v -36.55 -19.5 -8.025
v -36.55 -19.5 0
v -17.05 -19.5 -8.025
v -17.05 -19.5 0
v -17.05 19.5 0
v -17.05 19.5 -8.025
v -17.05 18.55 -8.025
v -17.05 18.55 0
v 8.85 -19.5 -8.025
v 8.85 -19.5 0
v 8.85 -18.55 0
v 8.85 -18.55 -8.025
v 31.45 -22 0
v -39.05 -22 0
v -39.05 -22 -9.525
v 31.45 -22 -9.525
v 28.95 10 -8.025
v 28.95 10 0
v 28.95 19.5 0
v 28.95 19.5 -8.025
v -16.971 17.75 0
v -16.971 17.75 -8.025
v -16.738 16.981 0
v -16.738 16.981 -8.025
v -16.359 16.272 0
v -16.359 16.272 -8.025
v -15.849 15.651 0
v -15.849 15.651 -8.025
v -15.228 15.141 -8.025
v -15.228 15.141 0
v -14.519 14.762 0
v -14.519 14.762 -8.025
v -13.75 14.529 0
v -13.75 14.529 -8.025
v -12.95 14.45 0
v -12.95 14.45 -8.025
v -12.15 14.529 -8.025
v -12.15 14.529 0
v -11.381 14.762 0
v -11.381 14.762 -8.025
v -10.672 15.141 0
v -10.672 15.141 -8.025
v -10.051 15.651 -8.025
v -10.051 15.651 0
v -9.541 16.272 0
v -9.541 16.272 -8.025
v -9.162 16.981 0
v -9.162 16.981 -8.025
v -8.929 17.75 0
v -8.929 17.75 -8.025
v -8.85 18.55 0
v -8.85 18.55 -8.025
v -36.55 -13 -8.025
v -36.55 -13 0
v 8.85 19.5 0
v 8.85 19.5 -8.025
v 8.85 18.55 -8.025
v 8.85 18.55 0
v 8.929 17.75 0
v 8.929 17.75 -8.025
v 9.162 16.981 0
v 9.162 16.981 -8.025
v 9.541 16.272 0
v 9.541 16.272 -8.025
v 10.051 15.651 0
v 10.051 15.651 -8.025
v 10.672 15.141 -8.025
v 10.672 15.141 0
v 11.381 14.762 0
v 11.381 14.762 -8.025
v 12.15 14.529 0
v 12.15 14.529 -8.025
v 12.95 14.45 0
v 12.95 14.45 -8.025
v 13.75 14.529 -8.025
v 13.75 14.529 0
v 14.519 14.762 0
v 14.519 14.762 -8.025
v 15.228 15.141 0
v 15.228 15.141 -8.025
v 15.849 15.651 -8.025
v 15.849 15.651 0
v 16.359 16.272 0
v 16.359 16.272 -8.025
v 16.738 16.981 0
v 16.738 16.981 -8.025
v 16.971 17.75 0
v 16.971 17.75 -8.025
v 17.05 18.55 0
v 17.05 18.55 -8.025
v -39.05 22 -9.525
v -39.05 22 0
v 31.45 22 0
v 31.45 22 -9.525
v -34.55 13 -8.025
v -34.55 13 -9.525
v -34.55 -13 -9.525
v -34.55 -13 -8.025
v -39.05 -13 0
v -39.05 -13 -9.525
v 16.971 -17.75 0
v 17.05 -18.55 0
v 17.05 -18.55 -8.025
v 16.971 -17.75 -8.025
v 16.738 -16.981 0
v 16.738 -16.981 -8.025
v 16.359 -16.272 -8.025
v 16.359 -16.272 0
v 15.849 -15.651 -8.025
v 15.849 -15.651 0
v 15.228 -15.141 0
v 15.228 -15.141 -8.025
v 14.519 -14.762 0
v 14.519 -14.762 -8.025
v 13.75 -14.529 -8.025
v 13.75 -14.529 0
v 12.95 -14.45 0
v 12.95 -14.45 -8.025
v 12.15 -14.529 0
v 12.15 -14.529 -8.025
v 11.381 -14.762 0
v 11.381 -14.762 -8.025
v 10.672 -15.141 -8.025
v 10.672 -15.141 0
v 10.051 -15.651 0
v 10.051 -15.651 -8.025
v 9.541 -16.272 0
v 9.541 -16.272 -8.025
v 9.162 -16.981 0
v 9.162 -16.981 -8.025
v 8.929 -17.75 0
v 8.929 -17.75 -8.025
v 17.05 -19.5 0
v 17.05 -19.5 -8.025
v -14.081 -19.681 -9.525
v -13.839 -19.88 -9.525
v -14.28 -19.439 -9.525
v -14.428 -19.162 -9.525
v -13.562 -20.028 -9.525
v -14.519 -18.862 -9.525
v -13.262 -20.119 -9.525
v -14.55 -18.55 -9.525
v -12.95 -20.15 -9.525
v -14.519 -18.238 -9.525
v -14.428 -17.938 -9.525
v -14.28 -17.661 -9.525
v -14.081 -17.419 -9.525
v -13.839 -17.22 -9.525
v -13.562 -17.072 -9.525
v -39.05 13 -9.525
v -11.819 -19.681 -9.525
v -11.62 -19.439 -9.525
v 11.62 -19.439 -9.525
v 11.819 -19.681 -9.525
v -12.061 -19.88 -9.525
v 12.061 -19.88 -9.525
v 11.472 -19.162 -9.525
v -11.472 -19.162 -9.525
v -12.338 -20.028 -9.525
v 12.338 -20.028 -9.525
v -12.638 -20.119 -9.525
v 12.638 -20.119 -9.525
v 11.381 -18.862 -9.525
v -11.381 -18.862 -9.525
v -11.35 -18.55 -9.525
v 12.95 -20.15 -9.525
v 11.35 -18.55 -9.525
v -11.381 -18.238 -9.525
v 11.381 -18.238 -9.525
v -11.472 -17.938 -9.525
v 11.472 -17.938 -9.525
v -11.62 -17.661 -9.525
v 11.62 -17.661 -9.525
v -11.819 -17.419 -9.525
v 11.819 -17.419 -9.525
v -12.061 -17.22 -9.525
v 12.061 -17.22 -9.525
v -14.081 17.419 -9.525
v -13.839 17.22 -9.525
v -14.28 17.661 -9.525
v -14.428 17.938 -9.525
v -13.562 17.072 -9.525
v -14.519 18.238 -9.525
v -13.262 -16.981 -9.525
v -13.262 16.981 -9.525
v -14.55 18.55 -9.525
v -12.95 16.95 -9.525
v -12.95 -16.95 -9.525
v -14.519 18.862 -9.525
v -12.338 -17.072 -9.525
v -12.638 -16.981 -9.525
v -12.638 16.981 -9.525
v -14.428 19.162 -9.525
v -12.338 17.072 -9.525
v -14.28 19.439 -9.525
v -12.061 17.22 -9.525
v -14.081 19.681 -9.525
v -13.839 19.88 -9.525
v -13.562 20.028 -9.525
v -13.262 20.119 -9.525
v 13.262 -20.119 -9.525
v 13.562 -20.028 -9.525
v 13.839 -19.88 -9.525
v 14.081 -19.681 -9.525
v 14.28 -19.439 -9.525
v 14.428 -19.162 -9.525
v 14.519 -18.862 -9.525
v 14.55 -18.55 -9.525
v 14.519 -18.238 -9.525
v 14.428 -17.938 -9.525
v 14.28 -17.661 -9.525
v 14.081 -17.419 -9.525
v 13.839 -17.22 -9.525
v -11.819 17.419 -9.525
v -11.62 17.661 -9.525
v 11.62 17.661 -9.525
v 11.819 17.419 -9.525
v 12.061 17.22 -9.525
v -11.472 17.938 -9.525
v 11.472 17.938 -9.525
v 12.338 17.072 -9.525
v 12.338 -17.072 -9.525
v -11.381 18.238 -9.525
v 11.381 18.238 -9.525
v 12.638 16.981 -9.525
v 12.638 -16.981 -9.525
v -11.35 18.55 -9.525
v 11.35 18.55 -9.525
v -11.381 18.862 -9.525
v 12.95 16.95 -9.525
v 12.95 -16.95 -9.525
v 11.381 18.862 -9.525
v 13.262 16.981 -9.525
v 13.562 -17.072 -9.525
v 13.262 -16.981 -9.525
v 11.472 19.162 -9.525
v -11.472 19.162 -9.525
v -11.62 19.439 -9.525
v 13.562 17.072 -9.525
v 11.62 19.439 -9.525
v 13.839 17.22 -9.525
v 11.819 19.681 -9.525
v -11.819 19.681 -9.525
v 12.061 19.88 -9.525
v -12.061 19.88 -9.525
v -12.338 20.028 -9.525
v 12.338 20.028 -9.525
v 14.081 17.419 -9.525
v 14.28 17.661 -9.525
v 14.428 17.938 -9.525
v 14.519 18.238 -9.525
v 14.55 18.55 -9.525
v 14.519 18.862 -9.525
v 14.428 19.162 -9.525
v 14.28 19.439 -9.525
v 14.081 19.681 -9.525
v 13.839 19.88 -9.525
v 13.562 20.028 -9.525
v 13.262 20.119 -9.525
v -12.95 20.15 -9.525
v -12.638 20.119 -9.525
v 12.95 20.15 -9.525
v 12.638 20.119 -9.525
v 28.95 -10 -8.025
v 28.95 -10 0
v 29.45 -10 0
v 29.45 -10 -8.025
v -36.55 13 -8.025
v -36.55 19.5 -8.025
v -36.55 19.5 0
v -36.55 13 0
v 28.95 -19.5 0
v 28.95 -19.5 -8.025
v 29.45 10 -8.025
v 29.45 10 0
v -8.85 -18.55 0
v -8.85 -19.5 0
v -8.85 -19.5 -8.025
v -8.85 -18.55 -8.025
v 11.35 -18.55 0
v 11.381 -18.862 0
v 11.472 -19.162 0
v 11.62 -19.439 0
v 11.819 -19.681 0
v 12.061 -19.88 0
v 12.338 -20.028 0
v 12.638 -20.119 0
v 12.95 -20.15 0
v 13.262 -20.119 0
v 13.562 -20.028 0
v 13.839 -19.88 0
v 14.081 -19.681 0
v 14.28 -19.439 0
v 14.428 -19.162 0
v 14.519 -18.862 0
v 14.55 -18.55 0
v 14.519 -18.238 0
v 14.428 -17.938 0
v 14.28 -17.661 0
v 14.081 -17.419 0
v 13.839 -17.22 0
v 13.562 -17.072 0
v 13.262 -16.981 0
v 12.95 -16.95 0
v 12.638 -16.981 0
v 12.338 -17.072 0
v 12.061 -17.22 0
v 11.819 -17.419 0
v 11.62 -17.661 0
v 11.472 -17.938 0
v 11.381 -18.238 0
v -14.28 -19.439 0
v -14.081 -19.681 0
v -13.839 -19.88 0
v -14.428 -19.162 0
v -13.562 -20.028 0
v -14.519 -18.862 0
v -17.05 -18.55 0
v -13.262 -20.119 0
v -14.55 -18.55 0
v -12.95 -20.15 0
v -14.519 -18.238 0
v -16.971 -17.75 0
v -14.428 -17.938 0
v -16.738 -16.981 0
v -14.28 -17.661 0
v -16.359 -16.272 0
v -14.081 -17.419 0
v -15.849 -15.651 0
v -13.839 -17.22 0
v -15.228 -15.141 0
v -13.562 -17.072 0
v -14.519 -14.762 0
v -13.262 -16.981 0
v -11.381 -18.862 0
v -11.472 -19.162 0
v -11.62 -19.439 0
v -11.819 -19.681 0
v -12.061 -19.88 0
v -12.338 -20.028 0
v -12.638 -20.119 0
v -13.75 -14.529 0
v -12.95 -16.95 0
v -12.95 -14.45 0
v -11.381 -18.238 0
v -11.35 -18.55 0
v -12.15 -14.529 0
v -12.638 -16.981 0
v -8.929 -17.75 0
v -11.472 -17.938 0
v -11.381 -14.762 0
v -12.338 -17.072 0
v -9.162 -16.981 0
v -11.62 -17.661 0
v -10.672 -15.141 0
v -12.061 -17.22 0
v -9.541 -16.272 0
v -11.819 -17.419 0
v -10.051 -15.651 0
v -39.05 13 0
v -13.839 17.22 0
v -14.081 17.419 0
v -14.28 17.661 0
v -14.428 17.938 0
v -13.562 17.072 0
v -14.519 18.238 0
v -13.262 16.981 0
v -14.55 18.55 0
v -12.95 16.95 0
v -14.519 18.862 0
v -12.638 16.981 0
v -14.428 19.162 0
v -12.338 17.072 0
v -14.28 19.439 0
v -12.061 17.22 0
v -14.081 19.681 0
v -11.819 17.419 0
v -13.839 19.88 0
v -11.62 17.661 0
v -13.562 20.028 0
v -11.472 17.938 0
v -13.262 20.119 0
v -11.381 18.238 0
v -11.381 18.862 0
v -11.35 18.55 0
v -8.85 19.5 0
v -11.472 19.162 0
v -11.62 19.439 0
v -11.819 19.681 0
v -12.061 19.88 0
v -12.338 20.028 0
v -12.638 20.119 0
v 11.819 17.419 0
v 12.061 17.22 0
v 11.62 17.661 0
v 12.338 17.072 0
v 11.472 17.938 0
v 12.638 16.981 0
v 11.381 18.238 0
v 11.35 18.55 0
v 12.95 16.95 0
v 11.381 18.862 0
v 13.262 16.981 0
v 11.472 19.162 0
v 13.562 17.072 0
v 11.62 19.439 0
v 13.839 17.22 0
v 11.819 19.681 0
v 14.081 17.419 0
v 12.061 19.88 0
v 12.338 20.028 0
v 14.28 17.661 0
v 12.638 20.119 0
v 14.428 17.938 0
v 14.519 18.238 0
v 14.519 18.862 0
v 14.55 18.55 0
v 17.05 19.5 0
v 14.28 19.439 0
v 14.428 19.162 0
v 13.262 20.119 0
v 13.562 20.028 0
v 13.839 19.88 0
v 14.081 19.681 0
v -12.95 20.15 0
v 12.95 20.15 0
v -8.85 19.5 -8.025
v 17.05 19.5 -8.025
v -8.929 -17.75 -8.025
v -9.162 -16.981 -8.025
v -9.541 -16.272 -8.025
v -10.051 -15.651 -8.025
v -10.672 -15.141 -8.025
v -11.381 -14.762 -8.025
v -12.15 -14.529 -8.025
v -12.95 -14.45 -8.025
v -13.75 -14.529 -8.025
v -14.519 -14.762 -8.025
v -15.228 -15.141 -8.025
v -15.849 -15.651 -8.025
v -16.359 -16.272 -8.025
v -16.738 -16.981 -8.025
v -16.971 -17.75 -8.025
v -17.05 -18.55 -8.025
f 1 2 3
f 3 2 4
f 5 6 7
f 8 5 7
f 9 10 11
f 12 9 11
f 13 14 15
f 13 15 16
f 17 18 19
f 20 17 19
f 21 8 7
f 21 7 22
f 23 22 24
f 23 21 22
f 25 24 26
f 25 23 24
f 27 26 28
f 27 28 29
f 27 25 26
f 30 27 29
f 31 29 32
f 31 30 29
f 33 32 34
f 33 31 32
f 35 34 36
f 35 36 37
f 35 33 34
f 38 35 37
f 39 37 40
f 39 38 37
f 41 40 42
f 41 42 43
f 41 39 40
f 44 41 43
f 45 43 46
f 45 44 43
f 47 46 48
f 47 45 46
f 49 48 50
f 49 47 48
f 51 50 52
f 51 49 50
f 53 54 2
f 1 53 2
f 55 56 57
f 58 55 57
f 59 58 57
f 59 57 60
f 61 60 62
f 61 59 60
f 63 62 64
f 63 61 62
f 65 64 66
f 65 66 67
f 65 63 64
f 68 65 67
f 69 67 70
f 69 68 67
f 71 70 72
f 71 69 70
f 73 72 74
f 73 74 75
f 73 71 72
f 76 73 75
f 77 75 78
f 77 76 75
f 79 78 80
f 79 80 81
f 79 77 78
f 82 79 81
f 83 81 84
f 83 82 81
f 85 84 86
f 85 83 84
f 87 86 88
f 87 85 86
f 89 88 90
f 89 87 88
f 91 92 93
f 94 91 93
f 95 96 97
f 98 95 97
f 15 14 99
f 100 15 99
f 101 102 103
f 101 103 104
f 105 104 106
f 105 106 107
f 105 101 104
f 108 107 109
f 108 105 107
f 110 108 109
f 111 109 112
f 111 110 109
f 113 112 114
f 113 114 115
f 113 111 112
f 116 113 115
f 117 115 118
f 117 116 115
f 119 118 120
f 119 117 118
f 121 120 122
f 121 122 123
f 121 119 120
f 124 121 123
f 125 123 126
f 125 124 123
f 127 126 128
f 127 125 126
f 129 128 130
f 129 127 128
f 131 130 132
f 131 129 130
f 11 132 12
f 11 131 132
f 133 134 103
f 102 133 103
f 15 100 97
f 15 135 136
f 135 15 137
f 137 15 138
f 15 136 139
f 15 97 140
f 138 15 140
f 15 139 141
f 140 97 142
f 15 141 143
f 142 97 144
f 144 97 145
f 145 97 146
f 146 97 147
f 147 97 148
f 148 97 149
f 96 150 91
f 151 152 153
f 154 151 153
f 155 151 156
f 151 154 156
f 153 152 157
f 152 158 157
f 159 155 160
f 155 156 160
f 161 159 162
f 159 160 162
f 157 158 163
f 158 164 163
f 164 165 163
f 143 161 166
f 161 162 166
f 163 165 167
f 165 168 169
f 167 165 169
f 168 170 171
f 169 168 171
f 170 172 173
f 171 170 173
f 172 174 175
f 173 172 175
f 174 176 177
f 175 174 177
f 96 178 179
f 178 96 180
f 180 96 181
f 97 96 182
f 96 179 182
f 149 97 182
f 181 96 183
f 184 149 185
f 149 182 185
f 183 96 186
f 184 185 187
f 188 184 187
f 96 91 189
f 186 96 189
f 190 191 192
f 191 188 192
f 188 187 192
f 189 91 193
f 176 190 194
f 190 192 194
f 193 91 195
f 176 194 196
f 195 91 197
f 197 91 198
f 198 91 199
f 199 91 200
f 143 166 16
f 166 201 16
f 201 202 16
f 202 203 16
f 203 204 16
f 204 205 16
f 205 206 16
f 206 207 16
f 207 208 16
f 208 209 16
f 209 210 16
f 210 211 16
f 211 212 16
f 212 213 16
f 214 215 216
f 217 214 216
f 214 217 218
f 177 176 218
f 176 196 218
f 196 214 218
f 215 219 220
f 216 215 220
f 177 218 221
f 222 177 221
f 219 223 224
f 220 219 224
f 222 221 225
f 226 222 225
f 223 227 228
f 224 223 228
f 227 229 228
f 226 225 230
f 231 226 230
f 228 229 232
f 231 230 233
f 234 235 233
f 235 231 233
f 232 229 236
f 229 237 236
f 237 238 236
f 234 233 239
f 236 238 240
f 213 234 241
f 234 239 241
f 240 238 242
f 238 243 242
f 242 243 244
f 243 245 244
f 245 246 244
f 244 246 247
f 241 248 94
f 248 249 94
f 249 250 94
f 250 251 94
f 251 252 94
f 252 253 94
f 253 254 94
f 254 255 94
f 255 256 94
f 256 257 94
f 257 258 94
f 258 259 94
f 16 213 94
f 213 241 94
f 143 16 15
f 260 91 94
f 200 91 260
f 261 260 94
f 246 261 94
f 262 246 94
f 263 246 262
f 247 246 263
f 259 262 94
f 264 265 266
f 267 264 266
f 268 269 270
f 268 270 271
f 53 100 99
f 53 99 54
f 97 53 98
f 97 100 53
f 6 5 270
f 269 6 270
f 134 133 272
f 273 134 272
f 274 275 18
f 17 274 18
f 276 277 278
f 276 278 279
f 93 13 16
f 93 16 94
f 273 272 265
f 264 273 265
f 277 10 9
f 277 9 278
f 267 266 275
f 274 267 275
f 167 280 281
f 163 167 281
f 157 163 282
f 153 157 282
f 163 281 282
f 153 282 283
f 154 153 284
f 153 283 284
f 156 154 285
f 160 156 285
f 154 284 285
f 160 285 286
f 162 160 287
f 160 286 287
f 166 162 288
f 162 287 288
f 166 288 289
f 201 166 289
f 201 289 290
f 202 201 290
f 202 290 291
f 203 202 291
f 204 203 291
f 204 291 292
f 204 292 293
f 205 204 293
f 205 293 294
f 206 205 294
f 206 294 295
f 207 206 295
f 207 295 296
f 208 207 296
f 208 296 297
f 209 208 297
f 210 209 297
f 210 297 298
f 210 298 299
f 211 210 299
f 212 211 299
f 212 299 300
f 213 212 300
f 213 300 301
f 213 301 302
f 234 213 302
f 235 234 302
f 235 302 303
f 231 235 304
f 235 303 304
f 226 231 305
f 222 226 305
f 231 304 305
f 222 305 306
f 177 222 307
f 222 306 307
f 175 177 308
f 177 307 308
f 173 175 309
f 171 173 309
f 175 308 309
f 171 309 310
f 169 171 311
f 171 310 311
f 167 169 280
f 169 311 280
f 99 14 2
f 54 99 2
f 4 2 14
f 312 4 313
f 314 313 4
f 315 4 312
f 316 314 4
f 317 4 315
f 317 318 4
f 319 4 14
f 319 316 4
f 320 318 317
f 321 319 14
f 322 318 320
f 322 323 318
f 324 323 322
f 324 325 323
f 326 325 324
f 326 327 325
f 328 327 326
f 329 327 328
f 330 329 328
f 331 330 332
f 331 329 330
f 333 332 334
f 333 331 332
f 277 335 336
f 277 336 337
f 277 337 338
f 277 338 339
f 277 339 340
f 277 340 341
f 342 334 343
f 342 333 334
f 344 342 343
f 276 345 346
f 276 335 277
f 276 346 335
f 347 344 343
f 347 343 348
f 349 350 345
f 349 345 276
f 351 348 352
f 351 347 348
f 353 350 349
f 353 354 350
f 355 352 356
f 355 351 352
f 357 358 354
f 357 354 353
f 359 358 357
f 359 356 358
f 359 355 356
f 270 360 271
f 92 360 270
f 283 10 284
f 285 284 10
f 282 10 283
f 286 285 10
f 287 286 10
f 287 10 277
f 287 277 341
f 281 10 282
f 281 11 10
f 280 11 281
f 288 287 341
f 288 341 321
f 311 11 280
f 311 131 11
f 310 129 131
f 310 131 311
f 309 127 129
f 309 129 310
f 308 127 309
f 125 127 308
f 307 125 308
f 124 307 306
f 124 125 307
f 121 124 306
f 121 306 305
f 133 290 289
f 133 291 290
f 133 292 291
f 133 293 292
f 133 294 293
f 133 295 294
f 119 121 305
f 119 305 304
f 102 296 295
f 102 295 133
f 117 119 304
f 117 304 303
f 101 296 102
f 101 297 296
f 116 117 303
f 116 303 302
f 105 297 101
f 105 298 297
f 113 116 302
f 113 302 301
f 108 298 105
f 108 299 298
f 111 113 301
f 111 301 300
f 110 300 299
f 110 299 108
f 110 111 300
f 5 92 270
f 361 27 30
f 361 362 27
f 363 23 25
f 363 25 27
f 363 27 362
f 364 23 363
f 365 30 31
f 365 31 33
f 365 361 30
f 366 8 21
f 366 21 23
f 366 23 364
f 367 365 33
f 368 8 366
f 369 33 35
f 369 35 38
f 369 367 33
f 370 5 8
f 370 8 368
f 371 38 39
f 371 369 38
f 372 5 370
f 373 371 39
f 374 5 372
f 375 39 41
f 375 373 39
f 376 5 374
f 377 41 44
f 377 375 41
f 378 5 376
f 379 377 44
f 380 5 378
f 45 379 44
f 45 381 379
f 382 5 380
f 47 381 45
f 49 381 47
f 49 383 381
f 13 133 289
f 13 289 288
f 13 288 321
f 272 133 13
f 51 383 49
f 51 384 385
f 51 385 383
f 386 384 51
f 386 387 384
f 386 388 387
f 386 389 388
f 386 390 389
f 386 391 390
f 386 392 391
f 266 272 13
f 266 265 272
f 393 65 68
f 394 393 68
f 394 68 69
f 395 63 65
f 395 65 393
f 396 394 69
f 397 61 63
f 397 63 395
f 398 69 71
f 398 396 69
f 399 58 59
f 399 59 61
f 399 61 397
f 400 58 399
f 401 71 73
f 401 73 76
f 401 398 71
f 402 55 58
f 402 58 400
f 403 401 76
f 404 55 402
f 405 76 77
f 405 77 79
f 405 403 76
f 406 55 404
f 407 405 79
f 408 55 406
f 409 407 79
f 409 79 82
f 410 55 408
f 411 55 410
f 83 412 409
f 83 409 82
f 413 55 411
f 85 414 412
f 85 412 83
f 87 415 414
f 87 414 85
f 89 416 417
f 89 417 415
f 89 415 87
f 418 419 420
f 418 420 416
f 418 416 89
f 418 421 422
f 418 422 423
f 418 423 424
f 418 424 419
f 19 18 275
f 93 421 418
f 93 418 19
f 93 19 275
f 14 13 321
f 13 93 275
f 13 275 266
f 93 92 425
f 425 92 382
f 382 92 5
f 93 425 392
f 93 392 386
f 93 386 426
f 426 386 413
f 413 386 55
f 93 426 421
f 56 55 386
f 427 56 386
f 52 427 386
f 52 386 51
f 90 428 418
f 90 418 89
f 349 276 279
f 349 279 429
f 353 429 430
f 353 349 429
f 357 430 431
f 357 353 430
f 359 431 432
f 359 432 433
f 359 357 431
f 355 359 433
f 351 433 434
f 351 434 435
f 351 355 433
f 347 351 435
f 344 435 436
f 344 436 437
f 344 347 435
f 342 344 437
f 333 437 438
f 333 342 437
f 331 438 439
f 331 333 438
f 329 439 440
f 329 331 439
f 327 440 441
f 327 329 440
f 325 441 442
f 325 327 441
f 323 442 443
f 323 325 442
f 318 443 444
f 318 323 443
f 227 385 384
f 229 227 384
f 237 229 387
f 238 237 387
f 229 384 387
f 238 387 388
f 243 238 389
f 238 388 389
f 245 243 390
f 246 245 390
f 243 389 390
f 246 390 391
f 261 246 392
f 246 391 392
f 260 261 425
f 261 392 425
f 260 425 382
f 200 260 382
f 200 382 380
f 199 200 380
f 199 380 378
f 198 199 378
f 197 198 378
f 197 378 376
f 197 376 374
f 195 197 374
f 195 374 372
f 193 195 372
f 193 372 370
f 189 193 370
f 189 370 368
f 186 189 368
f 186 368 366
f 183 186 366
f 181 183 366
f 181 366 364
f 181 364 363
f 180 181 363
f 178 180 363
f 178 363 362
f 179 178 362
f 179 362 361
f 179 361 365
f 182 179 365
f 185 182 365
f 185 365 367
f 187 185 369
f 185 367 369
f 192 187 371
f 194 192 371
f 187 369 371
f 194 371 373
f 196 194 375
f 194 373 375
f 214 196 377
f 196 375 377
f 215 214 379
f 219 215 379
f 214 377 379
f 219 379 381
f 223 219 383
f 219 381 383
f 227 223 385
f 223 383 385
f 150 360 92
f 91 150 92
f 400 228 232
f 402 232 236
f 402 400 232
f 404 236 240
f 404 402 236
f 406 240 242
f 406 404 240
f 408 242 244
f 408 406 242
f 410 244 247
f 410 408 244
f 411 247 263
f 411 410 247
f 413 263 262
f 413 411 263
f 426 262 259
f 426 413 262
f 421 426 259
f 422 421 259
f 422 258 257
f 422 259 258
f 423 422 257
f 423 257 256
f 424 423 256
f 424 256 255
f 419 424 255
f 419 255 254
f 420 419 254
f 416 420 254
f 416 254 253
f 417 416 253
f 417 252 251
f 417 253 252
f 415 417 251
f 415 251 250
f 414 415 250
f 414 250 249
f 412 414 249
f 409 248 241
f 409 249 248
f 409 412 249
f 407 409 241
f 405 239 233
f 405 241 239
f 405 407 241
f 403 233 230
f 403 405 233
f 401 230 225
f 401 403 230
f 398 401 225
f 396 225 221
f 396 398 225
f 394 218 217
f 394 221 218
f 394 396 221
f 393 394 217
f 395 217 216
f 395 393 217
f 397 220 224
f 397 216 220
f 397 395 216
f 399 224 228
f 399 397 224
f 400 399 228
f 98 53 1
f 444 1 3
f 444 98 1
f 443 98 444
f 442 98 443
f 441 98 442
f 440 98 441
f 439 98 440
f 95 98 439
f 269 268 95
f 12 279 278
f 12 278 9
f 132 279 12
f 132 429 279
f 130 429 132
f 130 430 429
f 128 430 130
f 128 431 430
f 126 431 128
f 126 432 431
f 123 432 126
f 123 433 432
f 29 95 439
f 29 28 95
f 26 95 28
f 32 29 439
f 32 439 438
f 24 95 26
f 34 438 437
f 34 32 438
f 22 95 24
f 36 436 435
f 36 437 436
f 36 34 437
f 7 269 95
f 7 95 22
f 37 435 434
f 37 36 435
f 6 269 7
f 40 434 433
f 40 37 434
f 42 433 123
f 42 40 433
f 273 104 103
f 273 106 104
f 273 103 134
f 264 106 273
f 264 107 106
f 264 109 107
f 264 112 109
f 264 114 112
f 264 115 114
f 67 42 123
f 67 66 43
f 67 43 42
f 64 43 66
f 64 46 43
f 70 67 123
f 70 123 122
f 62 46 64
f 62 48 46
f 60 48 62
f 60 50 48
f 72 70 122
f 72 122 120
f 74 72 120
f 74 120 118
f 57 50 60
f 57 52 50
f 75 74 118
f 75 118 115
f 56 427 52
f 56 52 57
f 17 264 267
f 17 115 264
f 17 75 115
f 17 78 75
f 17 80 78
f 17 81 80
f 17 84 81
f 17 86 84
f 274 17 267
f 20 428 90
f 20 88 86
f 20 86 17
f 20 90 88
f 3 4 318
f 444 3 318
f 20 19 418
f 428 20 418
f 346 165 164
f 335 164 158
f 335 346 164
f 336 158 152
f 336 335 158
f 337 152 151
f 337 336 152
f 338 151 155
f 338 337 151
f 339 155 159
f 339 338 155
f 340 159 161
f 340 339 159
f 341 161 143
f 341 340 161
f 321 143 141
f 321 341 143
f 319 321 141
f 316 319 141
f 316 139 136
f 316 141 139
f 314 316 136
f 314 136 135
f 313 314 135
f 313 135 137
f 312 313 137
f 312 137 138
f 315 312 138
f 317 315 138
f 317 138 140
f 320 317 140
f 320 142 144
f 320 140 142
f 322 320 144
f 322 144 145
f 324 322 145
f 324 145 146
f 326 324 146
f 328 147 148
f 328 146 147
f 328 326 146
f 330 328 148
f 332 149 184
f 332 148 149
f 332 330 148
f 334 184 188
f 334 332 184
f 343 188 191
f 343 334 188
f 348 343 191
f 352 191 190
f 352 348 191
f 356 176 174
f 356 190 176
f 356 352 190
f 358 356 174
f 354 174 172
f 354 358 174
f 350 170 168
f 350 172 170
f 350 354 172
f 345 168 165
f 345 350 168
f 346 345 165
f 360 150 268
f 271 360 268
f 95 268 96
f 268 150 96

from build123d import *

# Parameters (mm, degrees)
SKETCH_W                = 70.5
SKETCH_H                = 44
PAD_DEPTH               = 9.525
SKETCH001_R             = 1.6
POCKET_DEPTH            = 176.821853
SKETCH001_MIRRORED_2_R  = 1.6
POCKET_MIRRORED_2_DEPTH = 176.821853
POCKET001_DEPTH         = 8.025
SKETCH003_W             = 4.5
SKETCH003_H             = 26
POCKET002_DEPTH         = 9.526


with BuildPart() as part:
    # Sketch → Pad (new body)
    with BuildSketch(Plane.XY):
        with Locations((-3.8, 0)):
            Rectangle(SKETCH_W, SKETCH_H)
    extrude(amount=-PAD_DEPTH)

    # Sketch001 (on Face5 of Pad) → Pocket (cut, through all)
    with BuildSketch(Plane.XY):
        with Locations((-12.95, 18.55)):
            Circle(SKETCH001_R)
    pocket = extrude(amount=-POCKET_DEPTH, mode=Mode.SUBTRACT)

    # Sketch001 Mirrored 2 → Pocket Mirrored 2 (cut, through all)
    with BuildSketch(Plane(origin=(0, 0, 0), x_dir=(-1, 0, 0), z_dir=(0, 0, -1))):
        with Locations((-12.95, 18.55)):
            Circle(SKETCH001_MIRRORED_2_R)
    pocket_mirrored_2 = extrude(amount=POCKET_MIRRORED_2_DEPTH, mode=Mode.SUBTRACT)

    # Mirrored001: Pocket, Pocket Mirrored 2 across XZ
    add(pocket.mirror(Plane.XZ), mode=Mode.SUBTRACT)
    add(pocket_mirrored_2.mirror(Plane.XZ), mode=Mode.SUBTRACT)

    # Sketch002 (on Face4 of MultiTransform) → Pocket001 (cut)
    with BuildSketch(Plane.XY):
        with BuildLine():
            Line((29.45, -10), (29.45, 10))
            Line((29.45, 10), (28.95, 10))
            Line((28.95, 10), (28.95, 19.5))
            Line((28.95, 19.5), (17.05, 19.5))
            Line((17.05, 19.5), (17.05, 18.55))
            ThreePointArc((8.85, 18.55), (12.95, 14.45), (17.05, 18.55))
            Line((8.85, 19.5), (8.85, 18.55))
            Line((8.85, 19.5), (-8.85, 19.5))
            Line((-8.85, 19.5), (-8.85, 18.55))
            ThreePointArc((-17.05, 18.55), (-12.95, 14.45), (-8.85, 18.55))
            Line((-17.05, 19.5), (-17.05, 18.55))
            Line((-17.05, 19.5), (-36.55, 19.5))
            Line((-36.55, 19.5), (-36.55, -19.5))
            Line((-36.55, -19.5), (-17.05, -19.5))
            Line((-17.05, -19.5), (-17.05, -18.549995))
            ThreePointArc((-8.85, -18.549995), (-12.95, -14.45), (-17.05, -18.549995))
            Line((-8.85, -19.5), (-8.85, -18.549995))
            Line((8.85, -19.5), (-8.85, -19.5))
            Line((8.85, -19.5), (8.85, -18.549999))
            ThreePointArc((17.05, -18.55), (12.95, -14.45), (8.85, -18.549999))
            Line((17.05, -19.5), (17.05, -18.55))
            Line((17.05, -19.5), (28.95, -19.5))
            Line((28.95, -19.5), (28.95, -10))
            Line((28.95, -10), (29.45, -10))
        make_face()
    extrude(amount=-POCKET001_DEPTH, mode=Mode.SUBTRACT)

    # Sketch003 (on Face5 of Pocket001) → Pocket002 (cut, through all)
    with BuildSketch(Plane(origin=(0, 0, -9.525), x_dir=(1, 0, 0), z_dir=(0, 0, -1))):
        with Locations((-36.8, 0)):
            Rectangle(SKETCH003_W, SKETCH003_H)
    extrude(amount=-POCKET002_DEPTH, mode=Mode.SUBTRACT)


solid = part.part
